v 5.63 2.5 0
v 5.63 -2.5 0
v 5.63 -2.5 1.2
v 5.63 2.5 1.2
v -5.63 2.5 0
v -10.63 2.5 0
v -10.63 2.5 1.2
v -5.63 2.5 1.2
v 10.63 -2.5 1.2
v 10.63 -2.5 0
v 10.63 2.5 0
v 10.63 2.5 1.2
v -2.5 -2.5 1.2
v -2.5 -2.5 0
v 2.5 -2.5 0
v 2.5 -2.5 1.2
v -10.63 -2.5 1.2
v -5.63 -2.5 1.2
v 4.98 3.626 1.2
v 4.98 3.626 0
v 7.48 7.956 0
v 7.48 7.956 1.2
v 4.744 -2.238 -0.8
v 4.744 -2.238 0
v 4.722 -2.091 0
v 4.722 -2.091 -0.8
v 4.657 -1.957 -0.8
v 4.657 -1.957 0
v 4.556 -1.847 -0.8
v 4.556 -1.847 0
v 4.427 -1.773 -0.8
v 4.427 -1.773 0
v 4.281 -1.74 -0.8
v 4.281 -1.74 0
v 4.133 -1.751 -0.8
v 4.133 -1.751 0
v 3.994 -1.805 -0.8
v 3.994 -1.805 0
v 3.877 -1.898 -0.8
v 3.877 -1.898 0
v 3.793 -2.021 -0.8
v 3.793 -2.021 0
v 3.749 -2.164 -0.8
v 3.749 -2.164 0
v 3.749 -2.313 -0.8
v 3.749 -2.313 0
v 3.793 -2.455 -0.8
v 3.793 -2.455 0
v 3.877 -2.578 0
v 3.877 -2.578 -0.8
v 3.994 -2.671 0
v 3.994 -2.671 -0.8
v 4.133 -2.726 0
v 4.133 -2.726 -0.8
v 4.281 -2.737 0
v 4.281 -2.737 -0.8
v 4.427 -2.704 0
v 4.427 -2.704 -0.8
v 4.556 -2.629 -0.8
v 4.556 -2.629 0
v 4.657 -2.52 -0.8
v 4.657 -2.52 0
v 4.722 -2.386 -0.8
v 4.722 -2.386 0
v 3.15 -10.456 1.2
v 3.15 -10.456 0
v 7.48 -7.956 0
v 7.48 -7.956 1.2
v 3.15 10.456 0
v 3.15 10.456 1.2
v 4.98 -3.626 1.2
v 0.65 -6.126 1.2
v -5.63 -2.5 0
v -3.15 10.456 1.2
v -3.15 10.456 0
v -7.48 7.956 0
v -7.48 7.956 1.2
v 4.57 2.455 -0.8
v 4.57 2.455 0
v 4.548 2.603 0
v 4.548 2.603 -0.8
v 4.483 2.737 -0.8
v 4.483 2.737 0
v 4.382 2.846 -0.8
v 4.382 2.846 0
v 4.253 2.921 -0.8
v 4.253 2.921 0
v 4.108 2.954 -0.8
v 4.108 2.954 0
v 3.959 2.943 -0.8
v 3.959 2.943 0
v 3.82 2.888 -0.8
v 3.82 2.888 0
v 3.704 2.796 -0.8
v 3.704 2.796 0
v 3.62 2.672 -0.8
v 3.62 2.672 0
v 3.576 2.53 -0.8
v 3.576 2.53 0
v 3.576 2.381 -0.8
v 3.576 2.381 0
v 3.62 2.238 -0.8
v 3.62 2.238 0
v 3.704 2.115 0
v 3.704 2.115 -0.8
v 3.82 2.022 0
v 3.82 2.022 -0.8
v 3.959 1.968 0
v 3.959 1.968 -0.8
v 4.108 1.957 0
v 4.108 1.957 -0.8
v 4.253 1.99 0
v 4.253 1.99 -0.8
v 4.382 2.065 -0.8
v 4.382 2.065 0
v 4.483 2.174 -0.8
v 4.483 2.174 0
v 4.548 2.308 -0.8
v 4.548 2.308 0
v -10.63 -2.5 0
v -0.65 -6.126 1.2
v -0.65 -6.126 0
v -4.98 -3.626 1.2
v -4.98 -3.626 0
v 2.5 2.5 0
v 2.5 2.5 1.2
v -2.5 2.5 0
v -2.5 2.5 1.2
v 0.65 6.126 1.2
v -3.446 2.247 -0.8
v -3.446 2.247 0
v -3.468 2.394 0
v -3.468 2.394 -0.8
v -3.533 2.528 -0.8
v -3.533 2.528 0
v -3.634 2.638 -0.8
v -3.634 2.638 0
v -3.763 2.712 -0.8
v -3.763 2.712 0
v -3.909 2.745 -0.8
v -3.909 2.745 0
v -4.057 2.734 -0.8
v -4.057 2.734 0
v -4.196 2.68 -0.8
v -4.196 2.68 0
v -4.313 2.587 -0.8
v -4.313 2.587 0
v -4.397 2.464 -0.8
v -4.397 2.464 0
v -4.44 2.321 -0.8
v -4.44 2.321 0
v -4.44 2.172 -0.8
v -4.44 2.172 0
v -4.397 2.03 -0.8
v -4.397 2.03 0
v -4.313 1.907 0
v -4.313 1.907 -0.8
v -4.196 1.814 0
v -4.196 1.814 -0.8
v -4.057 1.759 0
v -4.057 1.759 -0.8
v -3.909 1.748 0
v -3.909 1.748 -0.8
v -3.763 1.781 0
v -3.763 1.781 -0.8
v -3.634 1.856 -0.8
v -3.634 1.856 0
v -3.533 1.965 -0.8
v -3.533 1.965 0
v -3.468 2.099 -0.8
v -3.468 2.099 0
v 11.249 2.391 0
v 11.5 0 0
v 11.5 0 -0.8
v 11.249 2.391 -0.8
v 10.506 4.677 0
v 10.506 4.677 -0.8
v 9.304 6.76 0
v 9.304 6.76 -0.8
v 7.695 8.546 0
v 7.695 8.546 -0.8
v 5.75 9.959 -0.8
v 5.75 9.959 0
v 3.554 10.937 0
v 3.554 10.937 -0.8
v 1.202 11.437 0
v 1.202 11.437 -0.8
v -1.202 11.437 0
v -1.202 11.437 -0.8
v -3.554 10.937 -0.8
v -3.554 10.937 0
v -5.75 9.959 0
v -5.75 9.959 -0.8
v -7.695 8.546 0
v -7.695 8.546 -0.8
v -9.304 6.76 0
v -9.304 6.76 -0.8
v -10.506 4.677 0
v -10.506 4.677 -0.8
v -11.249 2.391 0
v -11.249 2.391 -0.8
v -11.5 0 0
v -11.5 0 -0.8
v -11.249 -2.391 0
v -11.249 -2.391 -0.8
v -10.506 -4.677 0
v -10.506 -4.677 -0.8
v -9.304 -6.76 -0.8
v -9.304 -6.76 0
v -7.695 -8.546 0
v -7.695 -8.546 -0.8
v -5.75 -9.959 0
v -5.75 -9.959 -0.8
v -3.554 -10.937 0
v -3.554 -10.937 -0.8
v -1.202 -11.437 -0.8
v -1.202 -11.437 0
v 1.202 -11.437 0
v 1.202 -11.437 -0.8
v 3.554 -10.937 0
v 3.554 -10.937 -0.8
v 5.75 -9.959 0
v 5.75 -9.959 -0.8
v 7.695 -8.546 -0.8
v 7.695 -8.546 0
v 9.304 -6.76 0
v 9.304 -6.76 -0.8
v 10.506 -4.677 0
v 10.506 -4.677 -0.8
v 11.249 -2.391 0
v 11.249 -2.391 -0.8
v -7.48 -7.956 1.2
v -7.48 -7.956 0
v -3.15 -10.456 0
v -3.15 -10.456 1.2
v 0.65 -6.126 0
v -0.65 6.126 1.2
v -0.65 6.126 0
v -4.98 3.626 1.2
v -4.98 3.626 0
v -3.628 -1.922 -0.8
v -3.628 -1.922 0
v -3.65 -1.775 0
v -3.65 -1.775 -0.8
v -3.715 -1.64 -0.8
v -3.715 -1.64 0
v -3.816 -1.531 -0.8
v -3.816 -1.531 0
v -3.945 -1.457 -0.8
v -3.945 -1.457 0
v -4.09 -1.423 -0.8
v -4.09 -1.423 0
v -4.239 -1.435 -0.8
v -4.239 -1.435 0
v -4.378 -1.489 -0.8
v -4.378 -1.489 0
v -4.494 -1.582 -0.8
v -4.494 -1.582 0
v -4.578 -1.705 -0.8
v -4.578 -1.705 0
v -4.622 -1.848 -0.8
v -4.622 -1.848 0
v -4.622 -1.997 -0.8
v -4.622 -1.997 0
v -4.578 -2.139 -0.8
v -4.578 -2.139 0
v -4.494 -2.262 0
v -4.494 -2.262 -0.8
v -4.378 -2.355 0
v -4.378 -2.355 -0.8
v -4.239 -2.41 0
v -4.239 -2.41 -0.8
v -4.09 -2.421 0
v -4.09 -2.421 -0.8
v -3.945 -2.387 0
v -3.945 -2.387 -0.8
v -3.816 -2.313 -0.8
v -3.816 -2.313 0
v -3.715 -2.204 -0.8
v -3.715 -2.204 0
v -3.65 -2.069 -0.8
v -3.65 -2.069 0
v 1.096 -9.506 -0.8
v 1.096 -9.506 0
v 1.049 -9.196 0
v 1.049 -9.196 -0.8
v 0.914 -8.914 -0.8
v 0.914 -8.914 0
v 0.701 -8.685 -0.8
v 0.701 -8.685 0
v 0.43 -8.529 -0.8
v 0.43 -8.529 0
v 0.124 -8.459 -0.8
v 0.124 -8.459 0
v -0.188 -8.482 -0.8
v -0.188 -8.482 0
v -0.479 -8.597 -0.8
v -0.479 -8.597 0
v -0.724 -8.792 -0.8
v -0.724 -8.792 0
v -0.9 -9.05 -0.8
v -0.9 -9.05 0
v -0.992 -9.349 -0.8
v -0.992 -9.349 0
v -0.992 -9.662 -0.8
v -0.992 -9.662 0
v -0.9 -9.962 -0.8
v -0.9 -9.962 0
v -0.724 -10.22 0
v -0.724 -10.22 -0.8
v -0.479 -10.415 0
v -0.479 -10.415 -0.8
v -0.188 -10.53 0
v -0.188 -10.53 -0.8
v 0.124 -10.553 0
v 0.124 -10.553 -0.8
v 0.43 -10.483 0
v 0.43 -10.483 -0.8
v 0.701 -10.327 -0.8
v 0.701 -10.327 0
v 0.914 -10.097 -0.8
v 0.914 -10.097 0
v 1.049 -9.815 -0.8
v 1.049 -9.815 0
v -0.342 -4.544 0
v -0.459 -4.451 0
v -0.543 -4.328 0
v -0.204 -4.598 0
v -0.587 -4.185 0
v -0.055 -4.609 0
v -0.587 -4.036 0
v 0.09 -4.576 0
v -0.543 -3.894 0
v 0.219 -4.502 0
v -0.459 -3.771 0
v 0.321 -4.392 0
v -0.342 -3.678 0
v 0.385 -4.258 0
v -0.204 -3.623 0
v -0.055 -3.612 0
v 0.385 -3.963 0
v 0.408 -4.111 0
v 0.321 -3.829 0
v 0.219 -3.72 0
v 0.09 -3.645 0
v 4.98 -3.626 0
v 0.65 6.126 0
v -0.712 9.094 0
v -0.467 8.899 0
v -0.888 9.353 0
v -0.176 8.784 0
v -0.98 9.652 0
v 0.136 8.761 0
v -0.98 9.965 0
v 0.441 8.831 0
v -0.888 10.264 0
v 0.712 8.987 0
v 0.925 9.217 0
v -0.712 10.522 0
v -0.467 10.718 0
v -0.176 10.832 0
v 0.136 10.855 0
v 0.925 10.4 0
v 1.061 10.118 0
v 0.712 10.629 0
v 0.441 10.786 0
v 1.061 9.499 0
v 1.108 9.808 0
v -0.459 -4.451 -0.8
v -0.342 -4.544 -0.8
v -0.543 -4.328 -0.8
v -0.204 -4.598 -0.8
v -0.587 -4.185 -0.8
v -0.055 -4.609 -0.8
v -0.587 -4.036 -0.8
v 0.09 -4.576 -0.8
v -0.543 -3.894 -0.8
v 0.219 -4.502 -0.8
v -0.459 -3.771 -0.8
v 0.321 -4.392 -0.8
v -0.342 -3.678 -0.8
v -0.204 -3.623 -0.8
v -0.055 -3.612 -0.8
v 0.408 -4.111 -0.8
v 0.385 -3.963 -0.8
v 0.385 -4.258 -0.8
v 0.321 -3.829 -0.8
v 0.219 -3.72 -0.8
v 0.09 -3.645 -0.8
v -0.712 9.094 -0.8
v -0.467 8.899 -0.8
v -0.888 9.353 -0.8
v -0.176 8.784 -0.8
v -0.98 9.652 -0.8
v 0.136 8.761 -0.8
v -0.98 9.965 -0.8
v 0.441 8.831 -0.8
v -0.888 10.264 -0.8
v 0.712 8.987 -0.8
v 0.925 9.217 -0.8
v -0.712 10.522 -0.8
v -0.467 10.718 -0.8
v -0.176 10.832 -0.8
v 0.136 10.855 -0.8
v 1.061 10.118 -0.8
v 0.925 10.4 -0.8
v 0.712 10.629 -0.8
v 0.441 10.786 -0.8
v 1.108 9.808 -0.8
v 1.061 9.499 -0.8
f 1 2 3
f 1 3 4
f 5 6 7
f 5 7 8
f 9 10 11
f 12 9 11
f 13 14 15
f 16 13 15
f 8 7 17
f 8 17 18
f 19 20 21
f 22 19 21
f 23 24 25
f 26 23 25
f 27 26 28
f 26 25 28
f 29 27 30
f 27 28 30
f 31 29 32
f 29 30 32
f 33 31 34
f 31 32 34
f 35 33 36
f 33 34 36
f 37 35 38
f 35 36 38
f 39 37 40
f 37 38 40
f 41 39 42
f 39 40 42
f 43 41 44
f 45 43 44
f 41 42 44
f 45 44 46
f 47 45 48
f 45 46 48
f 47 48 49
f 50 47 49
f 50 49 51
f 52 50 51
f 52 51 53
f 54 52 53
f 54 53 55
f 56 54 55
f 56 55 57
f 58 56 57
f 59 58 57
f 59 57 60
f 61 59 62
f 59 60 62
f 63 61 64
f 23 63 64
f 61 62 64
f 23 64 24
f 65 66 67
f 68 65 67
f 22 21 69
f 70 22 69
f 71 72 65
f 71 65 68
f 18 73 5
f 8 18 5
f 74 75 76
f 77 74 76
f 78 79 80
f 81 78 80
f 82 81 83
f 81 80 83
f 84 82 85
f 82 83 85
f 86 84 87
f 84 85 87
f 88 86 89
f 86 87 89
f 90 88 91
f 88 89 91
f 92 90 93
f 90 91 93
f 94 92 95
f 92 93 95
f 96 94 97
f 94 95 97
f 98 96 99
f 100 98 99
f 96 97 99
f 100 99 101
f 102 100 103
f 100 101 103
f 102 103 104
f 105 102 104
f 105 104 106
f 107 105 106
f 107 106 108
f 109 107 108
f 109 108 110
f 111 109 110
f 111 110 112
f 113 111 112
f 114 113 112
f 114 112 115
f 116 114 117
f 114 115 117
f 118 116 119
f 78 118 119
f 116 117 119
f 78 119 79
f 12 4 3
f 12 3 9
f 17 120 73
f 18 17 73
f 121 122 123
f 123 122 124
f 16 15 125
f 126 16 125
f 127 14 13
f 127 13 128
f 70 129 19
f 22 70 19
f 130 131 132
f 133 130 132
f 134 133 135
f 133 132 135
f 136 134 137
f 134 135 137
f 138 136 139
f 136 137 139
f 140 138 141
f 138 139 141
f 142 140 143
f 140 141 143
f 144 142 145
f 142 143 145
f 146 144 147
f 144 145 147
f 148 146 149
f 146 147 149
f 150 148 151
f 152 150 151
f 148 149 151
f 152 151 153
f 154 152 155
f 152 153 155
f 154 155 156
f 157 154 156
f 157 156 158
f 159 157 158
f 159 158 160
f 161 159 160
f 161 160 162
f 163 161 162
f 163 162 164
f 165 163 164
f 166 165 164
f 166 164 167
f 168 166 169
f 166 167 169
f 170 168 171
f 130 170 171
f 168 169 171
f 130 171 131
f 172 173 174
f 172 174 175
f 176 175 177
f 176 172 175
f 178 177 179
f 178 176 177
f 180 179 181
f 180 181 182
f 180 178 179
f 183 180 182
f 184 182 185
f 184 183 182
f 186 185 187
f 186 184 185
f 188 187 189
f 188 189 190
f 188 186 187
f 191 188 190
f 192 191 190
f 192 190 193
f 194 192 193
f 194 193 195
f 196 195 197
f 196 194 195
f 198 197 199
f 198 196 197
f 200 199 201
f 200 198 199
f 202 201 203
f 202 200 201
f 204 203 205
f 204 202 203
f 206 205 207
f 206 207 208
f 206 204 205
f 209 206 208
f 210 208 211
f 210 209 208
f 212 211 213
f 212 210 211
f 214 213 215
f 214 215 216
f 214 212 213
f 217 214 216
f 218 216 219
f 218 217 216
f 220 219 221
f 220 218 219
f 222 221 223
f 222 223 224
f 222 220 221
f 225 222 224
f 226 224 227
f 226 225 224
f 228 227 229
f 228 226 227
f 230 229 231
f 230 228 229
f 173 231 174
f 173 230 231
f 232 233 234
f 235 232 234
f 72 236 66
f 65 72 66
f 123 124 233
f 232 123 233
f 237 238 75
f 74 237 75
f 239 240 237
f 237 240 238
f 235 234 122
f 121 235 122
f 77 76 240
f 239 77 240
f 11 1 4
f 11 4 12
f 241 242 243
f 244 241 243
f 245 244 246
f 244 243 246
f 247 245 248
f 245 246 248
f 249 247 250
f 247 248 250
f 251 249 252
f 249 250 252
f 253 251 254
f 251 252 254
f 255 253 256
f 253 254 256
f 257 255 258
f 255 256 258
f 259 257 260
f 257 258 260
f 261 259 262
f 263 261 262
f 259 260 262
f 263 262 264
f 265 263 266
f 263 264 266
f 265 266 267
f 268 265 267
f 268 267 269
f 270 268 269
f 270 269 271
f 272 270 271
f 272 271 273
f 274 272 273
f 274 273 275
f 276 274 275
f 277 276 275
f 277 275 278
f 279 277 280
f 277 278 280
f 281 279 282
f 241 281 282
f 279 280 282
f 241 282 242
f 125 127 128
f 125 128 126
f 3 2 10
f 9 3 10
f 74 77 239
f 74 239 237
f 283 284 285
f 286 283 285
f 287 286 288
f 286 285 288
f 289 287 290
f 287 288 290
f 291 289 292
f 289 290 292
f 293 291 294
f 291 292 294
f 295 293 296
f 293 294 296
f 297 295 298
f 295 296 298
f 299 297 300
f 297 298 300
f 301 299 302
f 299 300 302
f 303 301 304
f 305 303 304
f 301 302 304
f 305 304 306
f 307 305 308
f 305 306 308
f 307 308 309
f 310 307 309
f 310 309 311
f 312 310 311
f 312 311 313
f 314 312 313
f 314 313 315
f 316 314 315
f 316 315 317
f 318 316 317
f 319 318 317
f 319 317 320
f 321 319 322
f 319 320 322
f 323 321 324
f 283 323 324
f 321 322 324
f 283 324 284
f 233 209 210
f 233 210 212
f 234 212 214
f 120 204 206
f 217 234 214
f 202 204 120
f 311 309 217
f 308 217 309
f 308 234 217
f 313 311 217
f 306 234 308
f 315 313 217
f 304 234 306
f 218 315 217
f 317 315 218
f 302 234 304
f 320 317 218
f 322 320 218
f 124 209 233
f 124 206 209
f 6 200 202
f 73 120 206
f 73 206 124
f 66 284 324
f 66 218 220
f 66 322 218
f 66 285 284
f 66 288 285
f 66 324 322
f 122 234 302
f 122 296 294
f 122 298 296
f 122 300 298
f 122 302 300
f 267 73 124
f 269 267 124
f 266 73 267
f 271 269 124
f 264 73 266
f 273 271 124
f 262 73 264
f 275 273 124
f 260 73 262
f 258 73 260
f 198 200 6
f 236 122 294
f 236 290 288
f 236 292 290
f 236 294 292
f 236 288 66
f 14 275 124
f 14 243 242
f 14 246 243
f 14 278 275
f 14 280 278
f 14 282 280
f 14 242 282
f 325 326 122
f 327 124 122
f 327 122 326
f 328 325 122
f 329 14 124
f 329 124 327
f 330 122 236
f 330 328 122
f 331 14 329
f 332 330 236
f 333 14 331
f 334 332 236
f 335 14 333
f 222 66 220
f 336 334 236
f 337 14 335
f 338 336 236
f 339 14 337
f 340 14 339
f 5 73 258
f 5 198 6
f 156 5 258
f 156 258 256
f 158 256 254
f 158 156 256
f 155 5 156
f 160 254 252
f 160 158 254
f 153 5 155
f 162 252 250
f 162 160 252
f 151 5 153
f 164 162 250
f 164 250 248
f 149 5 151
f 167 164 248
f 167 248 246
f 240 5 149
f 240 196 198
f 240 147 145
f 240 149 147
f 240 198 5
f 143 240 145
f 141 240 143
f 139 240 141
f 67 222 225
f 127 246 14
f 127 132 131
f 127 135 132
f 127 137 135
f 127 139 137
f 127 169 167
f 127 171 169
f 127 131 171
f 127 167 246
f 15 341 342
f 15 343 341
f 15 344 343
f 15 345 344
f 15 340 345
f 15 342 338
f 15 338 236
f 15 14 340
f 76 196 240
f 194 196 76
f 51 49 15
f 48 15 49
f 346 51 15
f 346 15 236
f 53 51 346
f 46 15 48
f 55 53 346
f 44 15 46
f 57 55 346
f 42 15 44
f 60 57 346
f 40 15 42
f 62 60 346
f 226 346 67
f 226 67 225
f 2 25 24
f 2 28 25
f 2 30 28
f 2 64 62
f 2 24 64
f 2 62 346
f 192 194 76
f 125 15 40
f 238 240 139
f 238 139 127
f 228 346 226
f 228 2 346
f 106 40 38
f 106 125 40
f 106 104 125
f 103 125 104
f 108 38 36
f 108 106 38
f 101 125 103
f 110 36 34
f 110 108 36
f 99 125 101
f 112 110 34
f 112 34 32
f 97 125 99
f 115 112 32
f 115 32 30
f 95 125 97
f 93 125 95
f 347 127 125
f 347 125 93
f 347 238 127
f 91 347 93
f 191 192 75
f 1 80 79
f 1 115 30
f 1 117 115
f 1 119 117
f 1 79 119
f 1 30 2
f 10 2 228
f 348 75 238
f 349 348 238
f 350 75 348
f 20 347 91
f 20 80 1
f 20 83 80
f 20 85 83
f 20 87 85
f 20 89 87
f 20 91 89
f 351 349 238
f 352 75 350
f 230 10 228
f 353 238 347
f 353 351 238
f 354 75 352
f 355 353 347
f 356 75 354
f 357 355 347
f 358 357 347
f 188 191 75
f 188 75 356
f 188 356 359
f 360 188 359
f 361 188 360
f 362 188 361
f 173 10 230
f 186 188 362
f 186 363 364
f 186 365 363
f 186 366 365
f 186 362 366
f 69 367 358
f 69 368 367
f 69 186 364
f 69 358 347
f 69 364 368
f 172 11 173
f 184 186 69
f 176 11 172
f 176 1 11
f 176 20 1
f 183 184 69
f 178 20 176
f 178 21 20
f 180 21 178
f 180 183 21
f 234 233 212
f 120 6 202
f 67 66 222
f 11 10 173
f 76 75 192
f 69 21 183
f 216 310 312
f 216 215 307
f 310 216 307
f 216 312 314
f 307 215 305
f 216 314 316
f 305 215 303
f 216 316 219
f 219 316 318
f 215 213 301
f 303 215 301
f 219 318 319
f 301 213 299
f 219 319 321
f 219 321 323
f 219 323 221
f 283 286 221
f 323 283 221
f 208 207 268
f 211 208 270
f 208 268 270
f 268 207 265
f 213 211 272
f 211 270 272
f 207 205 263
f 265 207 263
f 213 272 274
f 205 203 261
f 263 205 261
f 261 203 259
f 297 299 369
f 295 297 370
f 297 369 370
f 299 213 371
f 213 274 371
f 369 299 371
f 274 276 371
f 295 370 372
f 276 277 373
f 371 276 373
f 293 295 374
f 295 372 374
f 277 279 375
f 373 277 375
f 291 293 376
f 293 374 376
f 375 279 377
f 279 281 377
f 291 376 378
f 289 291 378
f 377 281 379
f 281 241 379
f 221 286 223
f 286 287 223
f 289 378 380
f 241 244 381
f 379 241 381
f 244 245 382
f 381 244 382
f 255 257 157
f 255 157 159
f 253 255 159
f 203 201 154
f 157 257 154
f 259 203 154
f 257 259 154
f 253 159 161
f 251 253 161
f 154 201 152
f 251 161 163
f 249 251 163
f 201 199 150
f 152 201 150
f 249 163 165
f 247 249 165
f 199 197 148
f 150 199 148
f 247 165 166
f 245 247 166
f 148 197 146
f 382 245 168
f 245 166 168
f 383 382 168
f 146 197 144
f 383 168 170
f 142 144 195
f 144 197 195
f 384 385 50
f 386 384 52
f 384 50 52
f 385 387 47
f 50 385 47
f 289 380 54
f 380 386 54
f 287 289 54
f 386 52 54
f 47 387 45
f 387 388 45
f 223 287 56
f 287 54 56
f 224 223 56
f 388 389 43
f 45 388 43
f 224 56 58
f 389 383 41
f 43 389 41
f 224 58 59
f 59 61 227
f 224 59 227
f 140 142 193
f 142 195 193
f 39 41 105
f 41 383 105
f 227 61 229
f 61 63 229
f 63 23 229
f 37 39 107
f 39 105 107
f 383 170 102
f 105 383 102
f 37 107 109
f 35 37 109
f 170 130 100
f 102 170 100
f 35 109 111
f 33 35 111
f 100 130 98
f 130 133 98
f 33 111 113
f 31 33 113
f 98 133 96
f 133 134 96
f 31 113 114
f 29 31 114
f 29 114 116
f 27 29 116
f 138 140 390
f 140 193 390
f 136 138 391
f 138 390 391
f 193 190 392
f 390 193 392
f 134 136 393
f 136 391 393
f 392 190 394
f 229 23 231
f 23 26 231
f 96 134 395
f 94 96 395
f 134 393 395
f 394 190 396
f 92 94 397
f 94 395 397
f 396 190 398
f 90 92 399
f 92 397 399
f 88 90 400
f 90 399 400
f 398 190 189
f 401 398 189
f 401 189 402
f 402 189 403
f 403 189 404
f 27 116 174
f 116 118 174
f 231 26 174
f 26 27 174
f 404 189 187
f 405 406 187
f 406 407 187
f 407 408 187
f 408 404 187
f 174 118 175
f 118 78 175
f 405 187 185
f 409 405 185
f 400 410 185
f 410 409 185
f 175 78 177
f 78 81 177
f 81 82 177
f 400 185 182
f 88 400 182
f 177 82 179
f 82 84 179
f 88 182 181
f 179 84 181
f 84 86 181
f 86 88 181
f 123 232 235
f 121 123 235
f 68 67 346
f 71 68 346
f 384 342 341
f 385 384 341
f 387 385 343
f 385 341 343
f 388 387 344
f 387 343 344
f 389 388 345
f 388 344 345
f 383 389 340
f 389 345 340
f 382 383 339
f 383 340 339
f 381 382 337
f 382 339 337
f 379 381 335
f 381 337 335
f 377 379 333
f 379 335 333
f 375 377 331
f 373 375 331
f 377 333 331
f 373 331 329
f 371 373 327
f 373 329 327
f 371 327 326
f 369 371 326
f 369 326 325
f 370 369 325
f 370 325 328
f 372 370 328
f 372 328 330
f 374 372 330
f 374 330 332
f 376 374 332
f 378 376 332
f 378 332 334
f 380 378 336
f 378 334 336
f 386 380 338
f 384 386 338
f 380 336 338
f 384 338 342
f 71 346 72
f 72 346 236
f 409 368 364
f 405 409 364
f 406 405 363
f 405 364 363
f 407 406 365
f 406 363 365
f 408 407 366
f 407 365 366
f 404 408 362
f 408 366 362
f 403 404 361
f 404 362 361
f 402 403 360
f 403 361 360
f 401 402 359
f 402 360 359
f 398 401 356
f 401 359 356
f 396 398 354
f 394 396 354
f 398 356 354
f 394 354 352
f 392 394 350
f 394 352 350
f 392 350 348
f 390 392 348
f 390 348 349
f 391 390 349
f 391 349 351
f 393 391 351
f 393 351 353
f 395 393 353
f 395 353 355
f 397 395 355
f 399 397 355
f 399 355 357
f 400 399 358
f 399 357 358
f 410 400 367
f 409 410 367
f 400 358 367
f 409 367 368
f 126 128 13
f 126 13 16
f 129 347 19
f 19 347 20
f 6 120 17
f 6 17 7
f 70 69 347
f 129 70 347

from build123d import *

# Parameters (mm, degrees)
F0_R     = 11.5
F0_R_2   = 0.5
F0_R_3   = 1.05
F0_W     = 5
F0_H     = 5
F1_DEPTH = 0.8
F2_DEPTH = 1.2


with BuildPart() as f1:
    # F0 (on Top) → F1 (new body)
    with BuildSketch(Plane.XY):
        Circle(F0_R)
        Polygon((-4.980064, -3.625723), (-0.649936, -6.125723), (-3.149936, -10.45585), (-7.480064, -7.95585), align=None, mode=Mode.SUBTRACT)
        with Locations((-0.092426, -4.110796)):
            Circle(F0_R_2, mode=Mode.SUBTRACT)
        with Locations((-4.127668, -1.922055)):
            Circle(F0_R_2, mode=Mode.SUBTRACT)
        with Locations((0.046018, -9.505966)):
            Circle(F0_R_3, mode=Mode.SUBTRACT)
        Polygon((0.649936, -6.125723), (4.980064, -3.625723), (7.480064, -7.95585), (3.149936, -10.45585), align=None, mode=Mode.SUBTRACT)
        with Locations((4.24384, -2.238264)):
            Circle(F0_R_2, mode=Mode.SUBTRACT)
        with Locations((-8.13, 0)):
            Rectangle(F0_W, F0_H, mode=Mode.SUBTRACT)
        with Locations((-3.94603, 2.246665)):
            Circle(F0_R_2, mode=Mode.SUBTRACT)
        Polygon((-0.649936, 6.125723), (-4.980064, 3.625723), (-7.480064, 7.95585), (-3.149936, 10.45585), align=None, mode=Mode.SUBTRACT)
        Rectangle(F0_W, F0_H, mode=Mode.SUBTRACT)
        with Locations((4.07016, 2.455426)):
            Circle(F0_R_2, mode=Mode.SUBTRACT)
        with Locations((8.13, 0)):
            Rectangle(F0_W, F0_H, mode=Mode.SUBTRACT)
        Polygon((4.980064, 3.625723), (0.649936, 6.125723), (3.149936, 10.45585), (7.480064, 7.95585), align=None, mode=Mode.SUBTRACT)
        with Locations((0.057833, 9.808174)):
            Circle(F0_R_3, mode=Mode.SUBTRACT)
        Polygon((-7.480064, 7.95585), (-4.980064, 3.625723), (-0.649936, 6.125723), (-3.149936, 10.45585), align=None)
        Polygon((3.149936, 10.45585), (0.649936, 6.125723), (4.980064, 3.625723), (7.480064, 7.95585), align=None)
        with Locations((8.13, 0)):
            Rectangle(F0_W, F0_H)
        with Locations((-8.13, 0)):
            Rectangle(F0_W, F0_H)
        Rectangle(F0_W, F0_H)
        Polygon((-3.149936, -10.45585), (-0.649936, -6.125723), (-4.980064, -3.625723), (-7.480064, -7.95585), align=None)
        Polygon((7.480064, -7.95585), (4.980064, -3.625723), (0.649936, -6.125723), (3.149936, -10.45585), align=None)
    extrude(amount=-F1_DEPTH)

    # F0 (on Top) → F2 (join)
    with BuildSketch(Plane.XY):
        Polygon((-7.480064, 7.95585), (-4.980064, 3.625723), (-0.649936, 6.125723), (-3.149936, 10.45585), align=None)
        Polygon((3.149936, 10.45585), (0.649936, 6.125723), (4.980064, 3.625723), (7.480064, 7.95585), align=None)
        with Locations((-8.13, 0)):
            Rectangle(F0_W, F0_H)
        Rectangle(F0_W, F0_H)
        with Locations((8.13, 0)):
            Rectangle(F0_W, F0_H)
        Polygon((-3.149936, -10.45585), (-0.649936, -6.125723), (-4.980064, -3.625723), (-7.480064, -7.95585), align=None)
        Polygon((7.480064, -7.95585), (4.980064, -3.625723), (0.649936, -6.125723), (3.149936, -10.45585), align=None)
    extrude(amount=F2_DEPTH)


solid = f1.part
